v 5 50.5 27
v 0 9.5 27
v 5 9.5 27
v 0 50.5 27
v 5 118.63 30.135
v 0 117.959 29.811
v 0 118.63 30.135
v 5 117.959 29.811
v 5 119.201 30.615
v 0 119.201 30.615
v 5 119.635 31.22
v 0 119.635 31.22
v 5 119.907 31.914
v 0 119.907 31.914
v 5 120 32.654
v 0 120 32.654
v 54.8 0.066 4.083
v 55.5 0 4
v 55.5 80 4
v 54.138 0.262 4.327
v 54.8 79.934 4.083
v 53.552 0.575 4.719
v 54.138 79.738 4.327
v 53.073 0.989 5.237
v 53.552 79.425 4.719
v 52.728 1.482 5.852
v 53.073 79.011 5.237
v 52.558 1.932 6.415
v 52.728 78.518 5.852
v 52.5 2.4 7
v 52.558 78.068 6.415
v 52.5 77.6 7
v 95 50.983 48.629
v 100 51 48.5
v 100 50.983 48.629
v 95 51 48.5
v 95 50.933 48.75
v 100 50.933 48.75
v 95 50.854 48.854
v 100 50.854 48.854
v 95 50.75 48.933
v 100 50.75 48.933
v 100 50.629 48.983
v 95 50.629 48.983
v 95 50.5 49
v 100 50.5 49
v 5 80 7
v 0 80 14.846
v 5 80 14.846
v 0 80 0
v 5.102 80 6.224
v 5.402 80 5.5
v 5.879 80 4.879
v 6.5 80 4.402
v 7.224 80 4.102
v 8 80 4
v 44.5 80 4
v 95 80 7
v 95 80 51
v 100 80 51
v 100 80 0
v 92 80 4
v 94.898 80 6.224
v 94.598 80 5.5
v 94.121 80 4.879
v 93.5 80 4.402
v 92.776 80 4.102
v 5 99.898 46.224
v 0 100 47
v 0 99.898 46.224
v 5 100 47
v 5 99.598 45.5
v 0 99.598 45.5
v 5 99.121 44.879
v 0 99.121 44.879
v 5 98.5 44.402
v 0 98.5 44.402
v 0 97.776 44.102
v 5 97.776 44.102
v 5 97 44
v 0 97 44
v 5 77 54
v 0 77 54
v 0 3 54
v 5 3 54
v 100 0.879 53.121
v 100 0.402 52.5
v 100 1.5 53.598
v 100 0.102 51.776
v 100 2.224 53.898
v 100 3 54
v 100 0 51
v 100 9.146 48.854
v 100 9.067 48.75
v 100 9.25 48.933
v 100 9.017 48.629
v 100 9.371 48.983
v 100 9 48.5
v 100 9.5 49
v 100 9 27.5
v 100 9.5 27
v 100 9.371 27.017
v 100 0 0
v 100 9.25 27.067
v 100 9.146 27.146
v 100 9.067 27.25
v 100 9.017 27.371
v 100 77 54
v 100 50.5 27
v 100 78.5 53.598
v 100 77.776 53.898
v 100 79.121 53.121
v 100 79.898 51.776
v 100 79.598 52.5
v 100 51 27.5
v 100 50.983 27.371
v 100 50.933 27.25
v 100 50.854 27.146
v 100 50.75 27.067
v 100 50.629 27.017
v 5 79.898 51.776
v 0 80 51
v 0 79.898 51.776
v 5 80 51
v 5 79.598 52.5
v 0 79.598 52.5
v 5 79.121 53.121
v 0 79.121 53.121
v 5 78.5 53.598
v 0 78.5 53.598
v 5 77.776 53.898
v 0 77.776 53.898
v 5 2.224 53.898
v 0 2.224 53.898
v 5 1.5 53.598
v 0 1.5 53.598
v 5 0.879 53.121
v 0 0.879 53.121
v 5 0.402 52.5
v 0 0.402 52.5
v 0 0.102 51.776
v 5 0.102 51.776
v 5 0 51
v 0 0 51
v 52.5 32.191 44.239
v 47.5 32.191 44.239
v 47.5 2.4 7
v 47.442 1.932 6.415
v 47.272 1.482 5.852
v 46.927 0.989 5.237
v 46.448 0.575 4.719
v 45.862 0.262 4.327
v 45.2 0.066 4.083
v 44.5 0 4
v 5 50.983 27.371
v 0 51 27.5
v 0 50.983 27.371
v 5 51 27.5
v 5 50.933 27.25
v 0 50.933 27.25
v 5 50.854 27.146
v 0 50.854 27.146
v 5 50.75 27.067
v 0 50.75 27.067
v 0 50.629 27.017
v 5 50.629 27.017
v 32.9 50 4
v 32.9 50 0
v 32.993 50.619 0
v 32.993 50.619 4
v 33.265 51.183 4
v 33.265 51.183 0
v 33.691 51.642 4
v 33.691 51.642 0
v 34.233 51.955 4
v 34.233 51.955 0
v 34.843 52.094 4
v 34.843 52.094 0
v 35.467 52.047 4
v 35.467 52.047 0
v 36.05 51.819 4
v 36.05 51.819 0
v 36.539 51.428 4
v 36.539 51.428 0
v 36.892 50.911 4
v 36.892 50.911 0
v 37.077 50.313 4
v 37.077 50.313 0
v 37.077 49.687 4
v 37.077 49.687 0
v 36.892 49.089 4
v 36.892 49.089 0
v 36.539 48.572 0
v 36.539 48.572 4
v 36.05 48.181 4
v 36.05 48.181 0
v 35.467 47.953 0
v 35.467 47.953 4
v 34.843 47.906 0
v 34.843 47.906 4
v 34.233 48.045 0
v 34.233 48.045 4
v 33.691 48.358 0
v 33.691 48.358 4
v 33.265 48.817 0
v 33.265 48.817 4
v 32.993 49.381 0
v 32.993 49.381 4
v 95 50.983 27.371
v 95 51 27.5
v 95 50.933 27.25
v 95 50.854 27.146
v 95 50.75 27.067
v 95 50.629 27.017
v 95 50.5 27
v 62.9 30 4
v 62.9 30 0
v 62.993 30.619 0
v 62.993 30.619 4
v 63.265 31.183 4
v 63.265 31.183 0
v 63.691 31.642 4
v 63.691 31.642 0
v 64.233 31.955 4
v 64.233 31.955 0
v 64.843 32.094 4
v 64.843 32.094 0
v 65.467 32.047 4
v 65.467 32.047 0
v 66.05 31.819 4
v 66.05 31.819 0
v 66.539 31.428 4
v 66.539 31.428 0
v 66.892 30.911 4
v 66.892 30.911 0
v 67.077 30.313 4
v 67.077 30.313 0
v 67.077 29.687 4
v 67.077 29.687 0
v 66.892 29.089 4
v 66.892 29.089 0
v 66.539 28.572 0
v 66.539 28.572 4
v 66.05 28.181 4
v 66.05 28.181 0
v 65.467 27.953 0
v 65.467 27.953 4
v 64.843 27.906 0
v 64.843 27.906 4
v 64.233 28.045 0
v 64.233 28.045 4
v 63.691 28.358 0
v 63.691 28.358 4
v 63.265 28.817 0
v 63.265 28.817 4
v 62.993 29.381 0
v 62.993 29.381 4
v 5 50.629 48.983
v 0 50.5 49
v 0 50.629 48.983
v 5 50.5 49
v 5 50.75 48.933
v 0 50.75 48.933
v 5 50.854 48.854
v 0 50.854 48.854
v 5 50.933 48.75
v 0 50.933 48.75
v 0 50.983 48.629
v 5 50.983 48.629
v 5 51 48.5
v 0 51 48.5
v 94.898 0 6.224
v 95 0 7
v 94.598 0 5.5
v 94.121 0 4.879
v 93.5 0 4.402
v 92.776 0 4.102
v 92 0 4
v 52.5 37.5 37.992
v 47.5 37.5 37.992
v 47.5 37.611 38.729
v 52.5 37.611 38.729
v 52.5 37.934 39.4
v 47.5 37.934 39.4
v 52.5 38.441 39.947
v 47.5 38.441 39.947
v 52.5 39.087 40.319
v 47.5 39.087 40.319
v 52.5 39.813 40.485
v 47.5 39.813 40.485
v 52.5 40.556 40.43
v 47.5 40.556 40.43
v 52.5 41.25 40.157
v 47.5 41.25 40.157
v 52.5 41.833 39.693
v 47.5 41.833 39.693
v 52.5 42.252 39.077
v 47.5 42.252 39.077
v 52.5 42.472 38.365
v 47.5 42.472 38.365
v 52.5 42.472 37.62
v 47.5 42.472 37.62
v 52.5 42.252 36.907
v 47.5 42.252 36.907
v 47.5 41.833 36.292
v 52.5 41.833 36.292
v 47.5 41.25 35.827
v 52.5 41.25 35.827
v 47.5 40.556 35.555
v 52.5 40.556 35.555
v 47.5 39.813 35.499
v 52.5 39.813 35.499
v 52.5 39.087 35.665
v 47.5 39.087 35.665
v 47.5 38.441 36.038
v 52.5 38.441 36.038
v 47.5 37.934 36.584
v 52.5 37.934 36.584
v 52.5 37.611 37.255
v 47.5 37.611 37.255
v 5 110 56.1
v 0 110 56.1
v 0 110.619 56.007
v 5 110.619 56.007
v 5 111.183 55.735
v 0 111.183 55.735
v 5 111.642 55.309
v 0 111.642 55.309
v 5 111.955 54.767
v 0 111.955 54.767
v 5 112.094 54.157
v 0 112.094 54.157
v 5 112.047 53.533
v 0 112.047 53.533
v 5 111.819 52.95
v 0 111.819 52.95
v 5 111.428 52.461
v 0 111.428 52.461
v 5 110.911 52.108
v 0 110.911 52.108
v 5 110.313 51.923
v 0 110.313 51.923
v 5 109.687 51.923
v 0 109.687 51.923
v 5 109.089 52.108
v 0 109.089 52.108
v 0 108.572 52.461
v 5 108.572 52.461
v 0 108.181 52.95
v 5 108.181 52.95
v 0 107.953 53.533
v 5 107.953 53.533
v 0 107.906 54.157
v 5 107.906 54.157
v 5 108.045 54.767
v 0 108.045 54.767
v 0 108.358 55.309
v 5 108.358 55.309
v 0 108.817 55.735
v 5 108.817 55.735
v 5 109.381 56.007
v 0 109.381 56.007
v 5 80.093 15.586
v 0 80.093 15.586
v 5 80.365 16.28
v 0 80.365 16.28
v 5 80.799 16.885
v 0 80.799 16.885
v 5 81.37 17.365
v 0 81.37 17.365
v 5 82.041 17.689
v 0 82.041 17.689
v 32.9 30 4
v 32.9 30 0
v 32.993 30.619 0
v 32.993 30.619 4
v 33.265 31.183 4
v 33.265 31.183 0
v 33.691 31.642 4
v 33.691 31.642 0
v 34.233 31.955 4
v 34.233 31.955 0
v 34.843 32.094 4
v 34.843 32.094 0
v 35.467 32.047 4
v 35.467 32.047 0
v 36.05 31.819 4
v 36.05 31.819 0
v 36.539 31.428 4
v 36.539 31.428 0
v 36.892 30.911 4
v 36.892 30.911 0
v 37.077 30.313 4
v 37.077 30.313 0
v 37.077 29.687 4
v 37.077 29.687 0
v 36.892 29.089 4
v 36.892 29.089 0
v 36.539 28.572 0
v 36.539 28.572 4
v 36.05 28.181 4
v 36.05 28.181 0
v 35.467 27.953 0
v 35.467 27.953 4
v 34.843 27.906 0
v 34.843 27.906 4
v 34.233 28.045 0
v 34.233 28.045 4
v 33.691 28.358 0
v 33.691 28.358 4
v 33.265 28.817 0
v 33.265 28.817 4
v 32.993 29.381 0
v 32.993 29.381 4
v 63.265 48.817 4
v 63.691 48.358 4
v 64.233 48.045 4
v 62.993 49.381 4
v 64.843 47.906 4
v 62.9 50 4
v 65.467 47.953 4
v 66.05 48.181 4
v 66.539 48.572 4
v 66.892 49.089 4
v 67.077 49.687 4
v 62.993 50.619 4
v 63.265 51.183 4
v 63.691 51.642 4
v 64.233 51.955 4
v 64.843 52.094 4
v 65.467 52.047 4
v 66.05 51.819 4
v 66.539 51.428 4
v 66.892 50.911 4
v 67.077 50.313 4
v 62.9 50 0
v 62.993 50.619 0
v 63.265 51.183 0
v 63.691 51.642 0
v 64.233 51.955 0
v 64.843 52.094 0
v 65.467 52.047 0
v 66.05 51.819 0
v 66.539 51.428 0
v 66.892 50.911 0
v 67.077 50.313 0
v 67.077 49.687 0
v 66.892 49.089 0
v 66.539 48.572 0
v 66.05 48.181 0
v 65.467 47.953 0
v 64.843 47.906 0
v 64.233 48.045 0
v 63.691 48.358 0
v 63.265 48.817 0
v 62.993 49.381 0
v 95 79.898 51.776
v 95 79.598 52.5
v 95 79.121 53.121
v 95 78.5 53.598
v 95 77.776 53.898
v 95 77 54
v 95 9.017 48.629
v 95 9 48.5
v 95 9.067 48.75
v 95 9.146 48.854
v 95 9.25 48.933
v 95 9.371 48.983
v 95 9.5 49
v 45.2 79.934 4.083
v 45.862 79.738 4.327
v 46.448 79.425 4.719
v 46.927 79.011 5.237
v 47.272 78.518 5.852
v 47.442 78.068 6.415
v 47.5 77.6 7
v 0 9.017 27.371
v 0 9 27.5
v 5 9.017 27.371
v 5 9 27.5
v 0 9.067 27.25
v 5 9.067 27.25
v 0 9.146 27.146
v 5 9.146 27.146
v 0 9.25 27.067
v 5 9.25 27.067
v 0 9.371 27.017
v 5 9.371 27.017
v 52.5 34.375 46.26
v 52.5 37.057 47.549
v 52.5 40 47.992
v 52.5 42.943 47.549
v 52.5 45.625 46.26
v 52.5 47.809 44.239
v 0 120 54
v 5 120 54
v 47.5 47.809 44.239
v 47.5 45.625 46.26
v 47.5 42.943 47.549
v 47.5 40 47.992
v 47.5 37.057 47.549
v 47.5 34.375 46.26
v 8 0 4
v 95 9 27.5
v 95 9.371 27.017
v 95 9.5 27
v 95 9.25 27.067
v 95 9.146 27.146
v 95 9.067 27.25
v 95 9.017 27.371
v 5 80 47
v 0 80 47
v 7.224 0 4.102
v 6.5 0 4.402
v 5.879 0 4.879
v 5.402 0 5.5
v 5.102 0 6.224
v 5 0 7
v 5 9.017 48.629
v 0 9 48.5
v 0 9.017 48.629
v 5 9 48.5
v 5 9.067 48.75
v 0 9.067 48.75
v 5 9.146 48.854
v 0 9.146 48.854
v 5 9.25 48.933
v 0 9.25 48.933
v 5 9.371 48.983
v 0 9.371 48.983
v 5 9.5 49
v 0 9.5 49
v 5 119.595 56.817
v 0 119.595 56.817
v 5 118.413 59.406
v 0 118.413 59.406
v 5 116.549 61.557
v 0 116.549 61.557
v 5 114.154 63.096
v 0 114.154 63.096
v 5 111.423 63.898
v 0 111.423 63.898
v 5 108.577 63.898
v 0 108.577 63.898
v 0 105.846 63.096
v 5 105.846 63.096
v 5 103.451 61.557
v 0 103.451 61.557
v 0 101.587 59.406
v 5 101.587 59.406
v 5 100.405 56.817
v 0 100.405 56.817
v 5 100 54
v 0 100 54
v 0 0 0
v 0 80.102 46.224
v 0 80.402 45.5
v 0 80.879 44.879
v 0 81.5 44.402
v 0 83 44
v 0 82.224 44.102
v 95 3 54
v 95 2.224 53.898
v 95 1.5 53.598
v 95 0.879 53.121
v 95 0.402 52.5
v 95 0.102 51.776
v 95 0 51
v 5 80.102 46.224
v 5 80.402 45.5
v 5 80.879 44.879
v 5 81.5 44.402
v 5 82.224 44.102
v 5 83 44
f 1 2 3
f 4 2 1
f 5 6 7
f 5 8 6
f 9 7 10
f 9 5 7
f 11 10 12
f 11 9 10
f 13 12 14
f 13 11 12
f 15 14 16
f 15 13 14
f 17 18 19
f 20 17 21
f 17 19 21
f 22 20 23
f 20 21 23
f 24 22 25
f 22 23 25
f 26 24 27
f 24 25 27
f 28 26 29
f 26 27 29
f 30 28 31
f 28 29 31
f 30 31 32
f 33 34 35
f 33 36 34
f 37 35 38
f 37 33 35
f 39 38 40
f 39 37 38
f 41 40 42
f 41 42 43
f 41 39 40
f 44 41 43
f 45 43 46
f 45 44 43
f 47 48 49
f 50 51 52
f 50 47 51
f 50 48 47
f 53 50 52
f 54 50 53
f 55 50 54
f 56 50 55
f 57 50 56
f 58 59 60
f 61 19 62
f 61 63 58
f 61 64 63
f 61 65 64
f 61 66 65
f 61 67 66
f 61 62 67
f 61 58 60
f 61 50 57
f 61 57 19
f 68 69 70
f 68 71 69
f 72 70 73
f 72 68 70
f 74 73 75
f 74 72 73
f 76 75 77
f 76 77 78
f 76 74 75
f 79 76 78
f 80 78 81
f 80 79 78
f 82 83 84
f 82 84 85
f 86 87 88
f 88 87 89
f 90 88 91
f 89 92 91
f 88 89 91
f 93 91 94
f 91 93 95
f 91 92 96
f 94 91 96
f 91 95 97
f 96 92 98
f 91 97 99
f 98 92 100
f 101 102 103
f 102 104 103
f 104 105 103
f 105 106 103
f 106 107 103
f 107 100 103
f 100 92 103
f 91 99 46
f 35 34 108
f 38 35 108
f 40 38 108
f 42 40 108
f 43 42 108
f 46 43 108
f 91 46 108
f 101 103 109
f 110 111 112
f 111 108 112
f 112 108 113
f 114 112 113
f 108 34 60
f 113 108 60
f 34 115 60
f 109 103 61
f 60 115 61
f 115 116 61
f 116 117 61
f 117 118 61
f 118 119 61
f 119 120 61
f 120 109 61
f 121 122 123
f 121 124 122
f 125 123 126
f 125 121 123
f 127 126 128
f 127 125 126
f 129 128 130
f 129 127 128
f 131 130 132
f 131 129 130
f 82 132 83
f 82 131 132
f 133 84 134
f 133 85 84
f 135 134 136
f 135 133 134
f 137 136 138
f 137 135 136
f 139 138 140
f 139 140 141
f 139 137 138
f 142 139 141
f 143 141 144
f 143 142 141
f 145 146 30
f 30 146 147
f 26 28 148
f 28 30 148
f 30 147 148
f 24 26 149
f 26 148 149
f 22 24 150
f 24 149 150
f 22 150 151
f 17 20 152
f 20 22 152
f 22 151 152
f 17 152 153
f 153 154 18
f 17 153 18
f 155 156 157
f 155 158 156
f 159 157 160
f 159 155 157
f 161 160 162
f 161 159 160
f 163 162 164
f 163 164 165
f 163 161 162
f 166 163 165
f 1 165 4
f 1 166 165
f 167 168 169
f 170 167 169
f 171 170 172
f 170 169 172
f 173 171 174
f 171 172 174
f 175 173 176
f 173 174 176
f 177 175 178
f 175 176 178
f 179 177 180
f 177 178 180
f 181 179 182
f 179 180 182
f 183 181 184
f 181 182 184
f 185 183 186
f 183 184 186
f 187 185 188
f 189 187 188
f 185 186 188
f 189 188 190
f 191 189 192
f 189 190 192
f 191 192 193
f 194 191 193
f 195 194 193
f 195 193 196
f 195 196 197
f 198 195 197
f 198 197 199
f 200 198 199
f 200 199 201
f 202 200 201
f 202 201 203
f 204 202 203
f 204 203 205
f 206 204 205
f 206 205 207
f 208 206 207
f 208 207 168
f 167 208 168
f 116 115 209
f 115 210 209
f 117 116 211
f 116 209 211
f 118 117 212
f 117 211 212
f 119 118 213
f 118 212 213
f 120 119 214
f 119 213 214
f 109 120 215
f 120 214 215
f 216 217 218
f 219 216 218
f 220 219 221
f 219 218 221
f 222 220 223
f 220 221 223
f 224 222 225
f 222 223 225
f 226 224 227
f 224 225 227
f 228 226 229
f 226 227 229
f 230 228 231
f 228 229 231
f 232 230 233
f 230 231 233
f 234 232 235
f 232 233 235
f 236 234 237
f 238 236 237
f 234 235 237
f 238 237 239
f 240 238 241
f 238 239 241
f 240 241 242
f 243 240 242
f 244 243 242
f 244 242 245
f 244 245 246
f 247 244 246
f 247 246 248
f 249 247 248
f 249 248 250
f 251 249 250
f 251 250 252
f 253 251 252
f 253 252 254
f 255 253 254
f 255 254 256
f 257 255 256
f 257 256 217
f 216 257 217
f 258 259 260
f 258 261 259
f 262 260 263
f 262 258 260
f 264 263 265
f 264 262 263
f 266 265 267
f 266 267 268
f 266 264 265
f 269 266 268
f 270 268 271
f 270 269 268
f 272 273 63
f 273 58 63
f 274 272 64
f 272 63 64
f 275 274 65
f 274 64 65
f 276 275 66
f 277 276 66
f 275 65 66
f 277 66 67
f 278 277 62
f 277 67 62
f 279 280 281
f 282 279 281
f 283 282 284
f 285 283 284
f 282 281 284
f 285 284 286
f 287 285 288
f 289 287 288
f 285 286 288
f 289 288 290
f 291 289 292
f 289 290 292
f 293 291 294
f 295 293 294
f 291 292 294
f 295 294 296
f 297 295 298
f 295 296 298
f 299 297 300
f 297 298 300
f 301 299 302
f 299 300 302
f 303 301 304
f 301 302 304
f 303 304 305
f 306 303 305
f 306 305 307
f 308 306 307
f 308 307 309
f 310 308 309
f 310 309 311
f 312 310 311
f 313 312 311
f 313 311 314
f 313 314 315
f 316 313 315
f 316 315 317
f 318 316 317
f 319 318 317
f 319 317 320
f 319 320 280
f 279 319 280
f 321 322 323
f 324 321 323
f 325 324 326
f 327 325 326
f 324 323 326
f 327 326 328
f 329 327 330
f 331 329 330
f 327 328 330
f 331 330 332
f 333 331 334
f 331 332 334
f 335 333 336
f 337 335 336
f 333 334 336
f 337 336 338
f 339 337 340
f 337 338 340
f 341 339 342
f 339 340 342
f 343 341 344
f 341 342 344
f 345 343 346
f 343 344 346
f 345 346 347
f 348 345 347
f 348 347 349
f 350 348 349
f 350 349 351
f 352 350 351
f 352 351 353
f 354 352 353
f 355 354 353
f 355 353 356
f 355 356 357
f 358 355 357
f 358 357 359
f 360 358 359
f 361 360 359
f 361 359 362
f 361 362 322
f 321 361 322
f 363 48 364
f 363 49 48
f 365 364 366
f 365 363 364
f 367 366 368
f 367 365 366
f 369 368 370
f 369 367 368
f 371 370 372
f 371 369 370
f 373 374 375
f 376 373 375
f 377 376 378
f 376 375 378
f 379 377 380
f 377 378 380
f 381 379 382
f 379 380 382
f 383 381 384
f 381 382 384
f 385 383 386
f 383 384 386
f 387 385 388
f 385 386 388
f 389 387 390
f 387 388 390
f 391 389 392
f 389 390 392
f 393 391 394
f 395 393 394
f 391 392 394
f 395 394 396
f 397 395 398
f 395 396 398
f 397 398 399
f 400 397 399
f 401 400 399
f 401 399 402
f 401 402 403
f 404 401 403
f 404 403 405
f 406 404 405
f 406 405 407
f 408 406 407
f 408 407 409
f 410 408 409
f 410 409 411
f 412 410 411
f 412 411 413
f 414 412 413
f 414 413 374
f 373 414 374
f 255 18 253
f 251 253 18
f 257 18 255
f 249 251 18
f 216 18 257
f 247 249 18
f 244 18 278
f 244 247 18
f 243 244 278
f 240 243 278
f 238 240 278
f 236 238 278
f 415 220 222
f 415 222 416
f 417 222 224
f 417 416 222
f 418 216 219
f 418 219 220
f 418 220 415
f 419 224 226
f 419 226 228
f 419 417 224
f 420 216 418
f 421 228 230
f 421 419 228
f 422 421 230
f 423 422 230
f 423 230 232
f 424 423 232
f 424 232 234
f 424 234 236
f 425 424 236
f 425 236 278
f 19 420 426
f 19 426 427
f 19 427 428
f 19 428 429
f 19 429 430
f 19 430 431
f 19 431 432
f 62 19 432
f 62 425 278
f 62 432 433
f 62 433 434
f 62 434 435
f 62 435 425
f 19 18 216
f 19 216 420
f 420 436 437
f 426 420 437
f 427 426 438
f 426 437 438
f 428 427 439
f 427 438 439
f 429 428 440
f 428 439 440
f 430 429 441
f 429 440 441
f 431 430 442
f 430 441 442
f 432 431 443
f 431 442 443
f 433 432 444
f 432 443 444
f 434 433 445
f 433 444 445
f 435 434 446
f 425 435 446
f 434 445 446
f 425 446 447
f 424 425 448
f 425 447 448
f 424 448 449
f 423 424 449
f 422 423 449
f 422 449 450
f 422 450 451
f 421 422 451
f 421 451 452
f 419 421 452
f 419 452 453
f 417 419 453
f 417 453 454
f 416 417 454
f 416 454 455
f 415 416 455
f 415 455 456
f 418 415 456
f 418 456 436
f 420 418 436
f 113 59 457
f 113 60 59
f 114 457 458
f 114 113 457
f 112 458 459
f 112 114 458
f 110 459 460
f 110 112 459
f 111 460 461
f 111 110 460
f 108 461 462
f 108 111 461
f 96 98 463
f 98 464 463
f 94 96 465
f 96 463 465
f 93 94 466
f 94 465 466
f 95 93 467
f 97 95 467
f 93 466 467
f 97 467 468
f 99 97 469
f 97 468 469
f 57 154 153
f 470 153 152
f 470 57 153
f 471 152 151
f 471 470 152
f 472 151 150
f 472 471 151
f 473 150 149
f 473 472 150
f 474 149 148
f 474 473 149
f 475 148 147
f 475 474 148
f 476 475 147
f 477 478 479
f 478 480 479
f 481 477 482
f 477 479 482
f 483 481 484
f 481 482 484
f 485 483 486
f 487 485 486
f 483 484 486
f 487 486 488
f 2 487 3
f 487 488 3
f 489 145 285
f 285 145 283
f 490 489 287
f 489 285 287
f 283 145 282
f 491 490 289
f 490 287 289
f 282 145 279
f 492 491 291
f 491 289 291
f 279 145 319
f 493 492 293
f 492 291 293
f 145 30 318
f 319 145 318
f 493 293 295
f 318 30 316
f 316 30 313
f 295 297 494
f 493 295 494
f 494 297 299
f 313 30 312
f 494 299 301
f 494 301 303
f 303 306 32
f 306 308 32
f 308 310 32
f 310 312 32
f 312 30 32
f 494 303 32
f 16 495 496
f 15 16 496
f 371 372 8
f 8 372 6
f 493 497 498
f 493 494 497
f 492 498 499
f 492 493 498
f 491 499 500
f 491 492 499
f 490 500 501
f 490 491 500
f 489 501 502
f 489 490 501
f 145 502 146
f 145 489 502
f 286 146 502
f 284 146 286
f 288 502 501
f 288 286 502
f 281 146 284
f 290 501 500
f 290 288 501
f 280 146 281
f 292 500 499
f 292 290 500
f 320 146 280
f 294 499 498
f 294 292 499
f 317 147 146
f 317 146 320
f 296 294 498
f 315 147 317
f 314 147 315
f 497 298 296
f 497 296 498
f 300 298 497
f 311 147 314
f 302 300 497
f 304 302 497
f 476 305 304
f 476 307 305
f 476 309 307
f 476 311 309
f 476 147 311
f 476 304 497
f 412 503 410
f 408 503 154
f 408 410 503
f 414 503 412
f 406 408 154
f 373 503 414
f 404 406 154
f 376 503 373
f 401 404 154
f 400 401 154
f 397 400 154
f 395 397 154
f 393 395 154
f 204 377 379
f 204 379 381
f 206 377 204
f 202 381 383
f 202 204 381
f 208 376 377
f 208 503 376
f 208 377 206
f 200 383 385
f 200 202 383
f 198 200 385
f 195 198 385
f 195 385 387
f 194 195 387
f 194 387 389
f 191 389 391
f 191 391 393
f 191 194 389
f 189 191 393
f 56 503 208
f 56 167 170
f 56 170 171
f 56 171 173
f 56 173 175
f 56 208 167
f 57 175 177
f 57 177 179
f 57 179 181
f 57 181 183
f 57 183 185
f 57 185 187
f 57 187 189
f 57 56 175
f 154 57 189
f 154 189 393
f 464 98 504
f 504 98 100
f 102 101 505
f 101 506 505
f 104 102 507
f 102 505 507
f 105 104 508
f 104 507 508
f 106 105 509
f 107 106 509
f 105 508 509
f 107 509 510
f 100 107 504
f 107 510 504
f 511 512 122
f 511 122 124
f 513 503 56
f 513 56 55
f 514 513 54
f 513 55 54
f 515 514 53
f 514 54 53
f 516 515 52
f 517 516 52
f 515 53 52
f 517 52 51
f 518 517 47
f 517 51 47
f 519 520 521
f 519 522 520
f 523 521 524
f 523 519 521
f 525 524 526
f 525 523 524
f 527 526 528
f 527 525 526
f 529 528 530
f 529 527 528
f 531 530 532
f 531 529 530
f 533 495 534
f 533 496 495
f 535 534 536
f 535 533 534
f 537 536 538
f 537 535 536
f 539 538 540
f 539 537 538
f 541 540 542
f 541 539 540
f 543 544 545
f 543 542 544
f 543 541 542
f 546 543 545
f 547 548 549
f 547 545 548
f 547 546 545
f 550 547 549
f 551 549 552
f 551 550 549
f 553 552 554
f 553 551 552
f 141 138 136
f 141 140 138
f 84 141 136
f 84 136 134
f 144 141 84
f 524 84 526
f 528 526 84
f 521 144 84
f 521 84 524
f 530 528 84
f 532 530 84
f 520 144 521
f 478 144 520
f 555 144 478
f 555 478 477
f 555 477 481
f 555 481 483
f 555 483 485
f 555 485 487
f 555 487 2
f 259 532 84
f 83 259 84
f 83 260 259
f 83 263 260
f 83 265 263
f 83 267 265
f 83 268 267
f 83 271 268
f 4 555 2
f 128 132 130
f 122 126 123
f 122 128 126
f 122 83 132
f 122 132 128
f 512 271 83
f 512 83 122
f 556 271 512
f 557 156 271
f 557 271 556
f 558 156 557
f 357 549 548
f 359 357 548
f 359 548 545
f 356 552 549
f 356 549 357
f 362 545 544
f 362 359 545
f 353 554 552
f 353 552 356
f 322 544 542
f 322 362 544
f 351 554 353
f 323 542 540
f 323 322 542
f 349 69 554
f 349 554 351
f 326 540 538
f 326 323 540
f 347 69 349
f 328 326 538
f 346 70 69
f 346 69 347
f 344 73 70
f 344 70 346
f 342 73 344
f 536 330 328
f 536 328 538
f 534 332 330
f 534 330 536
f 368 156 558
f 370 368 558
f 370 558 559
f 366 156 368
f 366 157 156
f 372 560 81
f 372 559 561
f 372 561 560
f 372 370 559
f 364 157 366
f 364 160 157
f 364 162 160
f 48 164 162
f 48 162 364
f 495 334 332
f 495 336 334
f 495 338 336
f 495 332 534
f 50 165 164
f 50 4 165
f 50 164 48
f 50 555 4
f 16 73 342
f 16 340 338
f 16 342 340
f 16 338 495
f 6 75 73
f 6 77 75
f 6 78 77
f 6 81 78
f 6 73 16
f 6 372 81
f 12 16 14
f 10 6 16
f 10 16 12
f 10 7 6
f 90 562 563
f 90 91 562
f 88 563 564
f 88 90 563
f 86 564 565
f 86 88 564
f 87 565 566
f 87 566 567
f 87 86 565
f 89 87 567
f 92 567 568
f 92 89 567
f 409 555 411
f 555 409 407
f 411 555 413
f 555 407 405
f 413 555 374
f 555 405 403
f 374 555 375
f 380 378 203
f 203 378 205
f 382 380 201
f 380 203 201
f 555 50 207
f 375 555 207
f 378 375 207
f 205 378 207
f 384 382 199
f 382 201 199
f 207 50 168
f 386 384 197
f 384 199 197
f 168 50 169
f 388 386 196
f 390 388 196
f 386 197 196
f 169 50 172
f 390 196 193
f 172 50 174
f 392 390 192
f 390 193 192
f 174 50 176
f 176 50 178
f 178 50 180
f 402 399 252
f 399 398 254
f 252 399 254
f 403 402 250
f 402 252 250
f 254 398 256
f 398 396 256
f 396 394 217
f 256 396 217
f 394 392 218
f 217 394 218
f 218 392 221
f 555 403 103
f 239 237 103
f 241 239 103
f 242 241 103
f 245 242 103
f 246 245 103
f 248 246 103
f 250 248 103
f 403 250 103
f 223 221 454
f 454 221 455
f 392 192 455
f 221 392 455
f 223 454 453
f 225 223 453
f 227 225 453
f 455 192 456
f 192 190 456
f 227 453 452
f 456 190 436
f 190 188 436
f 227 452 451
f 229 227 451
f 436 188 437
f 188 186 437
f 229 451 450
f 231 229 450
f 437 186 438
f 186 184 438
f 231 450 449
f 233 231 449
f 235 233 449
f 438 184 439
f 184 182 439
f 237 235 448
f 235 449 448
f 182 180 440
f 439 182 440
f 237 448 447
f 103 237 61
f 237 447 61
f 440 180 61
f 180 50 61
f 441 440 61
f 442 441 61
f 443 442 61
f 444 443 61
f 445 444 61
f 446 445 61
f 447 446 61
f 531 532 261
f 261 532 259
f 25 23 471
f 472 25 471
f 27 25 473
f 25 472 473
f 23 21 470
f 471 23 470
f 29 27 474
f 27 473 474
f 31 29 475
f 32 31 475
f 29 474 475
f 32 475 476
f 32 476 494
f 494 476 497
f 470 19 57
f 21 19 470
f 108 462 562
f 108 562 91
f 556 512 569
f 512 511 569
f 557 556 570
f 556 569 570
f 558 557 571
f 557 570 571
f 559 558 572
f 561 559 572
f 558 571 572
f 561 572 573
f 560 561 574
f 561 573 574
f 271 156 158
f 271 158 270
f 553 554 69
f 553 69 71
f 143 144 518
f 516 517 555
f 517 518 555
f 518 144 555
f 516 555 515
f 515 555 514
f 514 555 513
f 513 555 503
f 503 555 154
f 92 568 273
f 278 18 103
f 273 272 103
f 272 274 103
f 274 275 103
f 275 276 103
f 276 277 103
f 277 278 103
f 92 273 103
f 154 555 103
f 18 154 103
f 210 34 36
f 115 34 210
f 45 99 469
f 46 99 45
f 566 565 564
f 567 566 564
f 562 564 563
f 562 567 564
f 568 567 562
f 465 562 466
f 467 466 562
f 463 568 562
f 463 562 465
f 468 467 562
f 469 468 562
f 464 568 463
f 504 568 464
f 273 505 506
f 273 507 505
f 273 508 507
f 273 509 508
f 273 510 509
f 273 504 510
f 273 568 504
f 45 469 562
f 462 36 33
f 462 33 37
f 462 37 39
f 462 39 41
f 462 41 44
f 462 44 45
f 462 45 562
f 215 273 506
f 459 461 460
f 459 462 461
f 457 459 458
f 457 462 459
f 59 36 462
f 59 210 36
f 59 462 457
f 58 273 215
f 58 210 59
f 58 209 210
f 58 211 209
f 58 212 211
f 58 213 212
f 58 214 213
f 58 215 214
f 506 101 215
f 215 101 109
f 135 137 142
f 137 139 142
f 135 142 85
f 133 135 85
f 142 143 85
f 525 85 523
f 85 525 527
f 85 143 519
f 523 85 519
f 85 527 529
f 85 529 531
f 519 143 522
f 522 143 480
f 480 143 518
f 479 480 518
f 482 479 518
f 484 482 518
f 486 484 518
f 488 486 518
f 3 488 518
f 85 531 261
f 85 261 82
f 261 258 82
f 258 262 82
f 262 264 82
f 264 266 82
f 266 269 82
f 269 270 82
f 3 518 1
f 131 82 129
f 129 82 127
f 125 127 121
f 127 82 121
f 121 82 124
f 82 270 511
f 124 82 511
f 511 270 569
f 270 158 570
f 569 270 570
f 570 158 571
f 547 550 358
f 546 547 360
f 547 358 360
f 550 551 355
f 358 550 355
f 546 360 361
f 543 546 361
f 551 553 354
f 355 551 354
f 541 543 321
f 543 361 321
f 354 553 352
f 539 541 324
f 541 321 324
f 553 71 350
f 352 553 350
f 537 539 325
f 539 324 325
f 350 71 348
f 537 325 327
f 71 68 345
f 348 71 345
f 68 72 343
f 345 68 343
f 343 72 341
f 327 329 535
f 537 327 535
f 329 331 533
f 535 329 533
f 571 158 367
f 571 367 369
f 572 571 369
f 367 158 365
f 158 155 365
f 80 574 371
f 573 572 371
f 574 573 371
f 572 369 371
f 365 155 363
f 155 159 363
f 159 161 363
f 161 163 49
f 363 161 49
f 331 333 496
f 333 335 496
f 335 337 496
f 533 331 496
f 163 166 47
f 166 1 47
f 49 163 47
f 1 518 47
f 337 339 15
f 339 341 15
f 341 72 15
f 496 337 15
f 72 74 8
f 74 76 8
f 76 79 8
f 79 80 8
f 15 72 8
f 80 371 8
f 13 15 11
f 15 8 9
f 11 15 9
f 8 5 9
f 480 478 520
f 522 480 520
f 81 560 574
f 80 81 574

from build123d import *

# Parameters (mm, degrees)
SKETCH_1_W          = 100
SKETCH_1_H          = 80
EXTRUDE_1_DEPTH     = 4
SKETCH_2_W          = 5
SKETCH_2_H          = 80
EXTRUDE_2_DEPTH     = 50
CUT_EXTRUDE_2_DEPTH = 5
FILLET_1_R          = 10
FILLET_2_R          = 3
FILLET_3_R          = 3
SKETCH_5_R          = 2.1
CUT_EXTRUDE_3_DEPTH = 5
SKETCH_6_R          = 2.5
CUT_EXTRUDE_4_DEPTH = 10
SKETCH_7_W          = 22
SKETCH_7_H          = 42
CUT_EXTRUDE_5_DEPTH = 10
SKETCH_8_W          = 22
SKETCH_8_H          = 42
CUT_EXTRUDE_6_DEPTH = 10
FILLET_4_R          = 0.5
FILLET_5_R          = 0.5
SKETCH_9_W          = 5
SKETCH_9_H          = 27
EXTRUDE_3_DEPTH     = 40
CUT_EXTRUDE_7_DEPTH = 20
SKETCH_11_W         = 5
SKETCH_11_H         = 20
EXTRUDE_4_DEPTH     = 20
FILLET_6_RADIUS     = 10
FILLET_6_LENGTH     = 5
FILLET_7_R          = 3
SKETCH_12_R         = 2.1
CUT_EXTRUDE_8_DEPTH = 20


with BuildPart() as part:
    # 草图1 → 凸台-拉伸1 (new body)
    with BuildSketch(Plane.XY):
        with Locations((50, 40)):
            Rectangle(SKETCH_1_W, SKETCH_1_H)
    extrude(amount=EXTRUDE_1_DEPTH)

    # 草图2 → 凸台-拉伸2 (add)
    with BuildSketch(Plane.XY.offset(4)):
        with Locations((2.5, 40)):
            Rectangle(SKETCH_2_W, SKETCH_2_H)
        with Locations((97.5, 40)):
            Rectangle(SKETCH_2_W, SKETCH_2_H)
        with Locations((50, 40)):
            Rectangle(SKETCH_2_W, SKETCH_2_H)
    extrude(amount=EXTRUDE_2_DEPTH)

    # 草图4 → 切除-拉伸2 (cut)
    with BuildSketch(Plane.ZY.offset(-47.5)):
        Polygon((54, 80), (4, 80), (54, 40), align=None)
        Polygon((54, 0), (54, 40), (4, 0), align=None)
    extrude(amount=-CUT_EXTRUDE_2_DEPTH, mode=Mode.SUBTRACT)

    # 圆角1
    fillet_1_edges = [part.edges().sort_by_distance(p)[0] for p in [
        (50, 40, 54),
    ]]
    fillet(fillet_1_edges, radius=FILLET_1_R)

    # 圆角2
    fillet_2_edges = [part.edges().sort_by_distance(p)[0] for p in [
        (5, 40, 4),
        (2.5, 0, 54),
        (2.5, 80, 54),
        (95, 40, 4),
        (97.5, 80, 54),
        (97.5, 0, 54),
    ]]
    fillet(fillet_2_edges, radius=FILLET_2_R)

    # 圆角3
    fillet_3_edges = [part.edges().sort_by_distance(p)[0] for p in [
        (47.5, 40, 4),
        (52.5, 40, 4),
    ]]
    fillet(fillet_3_edges, radius=FILLET_3_R)

    # 草图5 → 切除-拉伸3 (cut)
    with BuildSketch(Plane(origin=(0, 0, 0), x_dir=(-1, 0, 0), z_dir=(0, 0, -1))):
        with Locations((-65, 50)):
            Circle(SKETCH_5_R)
        with Locations((-35, 50)):
            Circle(SKETCH_5_R)
        with Locations((-65, 30)):
            Circle(SKETCH_5_R)
        with Locations((-35, 30)):
            Circle(SKETCH_5_R)
    extrude(amount=-CUT_EXTRUDE_3_DEPTH, mode=Mode.SUBTRACT)

    # 草图6 → 切除-拉伸4 (cut)
    with BuildSketch(Plane.ZY.offset(-47.5)):
        with Locations(Location((37.992189406, 40, 0), (0, 0, 270))):
            Circle(SKETCH_6_R)
    extrude(amount=-CUT_EXTRUDE_4_DEPTH, mode=Mode.SUBTRACT)

    # 草图7 → 切除-拉伸5 (cut)
    with BuildSketch(Plane.ZY):
        with Locations((38, 30)):
            Rectangle(SKETCH_7_W, SKETCH_7_H)
    extrude(amount=-CUT_EXTRUDE_5_DEPTH, mode=Mode.SUBTRACT)

    # 草图8 → 切除-拉伸6 (cut)
    with BuildSketch(Plane(origin=(100, 0, 0), x_dir=(0, 0, -1), z_dir=(1, 0, 0))):
        with Locations((-38, 30)):
            Rectangle(SKETCH_8_W, SKETCH_8_H)
    extrude(amount=-CUT_EXTRUDE_6_DEPTH, mode=Mode.SUBTRACT)

    # 圆角4
    fillet_4_edges = [part.edges().sort_by_distance(p)[0] for p in [
        (97.5, 9, 49),
        (97.5, 51, 49),
        (97.5, 51, 27),
        (97.5, 9, 27),
    ]]
    fillet(fillet_4_edges, radius=FILLET_4_R)

    # 圆角5
    fillet_5_edges = [part.edges().sort_by_distance(p)[0] for p in [
        (2.5, 9, 27),
        (2.5, 51, 27),
        (2.5, 51, 49),
        (2.5, 9, 49),
    ]]
    fillet(fillet_5_edges, radius=FILLET_5_R)

    # 草图9 → 凸台-拉伸3 (add)
    with BuildSketch(Plane(origin=(0, 80, 0), x_dir=(1, 0, 0), z_dir=(0, 1, 0))):
        with Locations((2.5, -30.5)):
            Rectangle(SKETCH_9_W, SKETCH_9_H)
    extrude(amount=EXTRUDE_3_DEPTH)

    # 草图10 → 切除-拉伸7 (cut)
    with BuildSketch(Plane.ZY):
        Polygon((17, 80), (30.5, 120), (17, 120), align=None)
    extrude(amount=-CUT_EXTRUDE_7_DEPTH, mode=Mode.SUBTRACT)

    # 草图11 → 凸台-拉伸4 (add)
    with BuildSketch(Plane.XY.offset(44)):
        with Locations((2.5, 110)):
            Rectangle(SKETCH_11_W, SKETCH_11_H)
    extrude(amount=EXTRUDE_4_DEPTH)

    # 圆角6: full round fillet: the end face becomes a half cylinder, R = half its width
    fillet_6_face = Plane((2.5, 110, 64), x_dir=(1, 0, 0), z_dir=(0, 0, 1))  # on the end face: x along it, z out of the body
    fillet_6_slab = fillet_6_face.offset(-FILLET_6_RADIUS / 2) * Box(FILLET_6_LENGTH, 2 * FILLET_6_RADIUS, FILLET_6_RADIUS, mode=Mode.PRIVATE)  # the body's end, R deep
    fillet_6_round = Plane((2.5, 110, 54), x_dir=(0, 0, 1), z_dir=(1, 0, 0)) * Cylinder(FILLET_6_RADIUS, FILLET_6_LENGTH, mode=Mode.PRIVATE)  # its axis R under the face
    add(fillet_6_slab - fillet_6_round, mode=Mode.SUBTRACT)

    # 圆角7
    fillet_7_edges = [part.edges().sort_by_distance(p)[0] for p in [
        (2.5, 80, 44),
        (2.5, 80, 17),
        (2.5, 120, 30.5),
        (2.5, 100, 44),
    ]]
    fillet(fillet_7_edges, radius=FILLET_7_R)

    # 草图12 → 切除-拉伸8 (cut)
    with BuildSketch(Plane.ZY):
        with Locations((54, 110)):
            Circle(SKETCH_12_R)
    extrude(amount=-CUT_EXTRUDE_8_DEPTH, mode=Mode.SUBTRACT)


solid = part.part
